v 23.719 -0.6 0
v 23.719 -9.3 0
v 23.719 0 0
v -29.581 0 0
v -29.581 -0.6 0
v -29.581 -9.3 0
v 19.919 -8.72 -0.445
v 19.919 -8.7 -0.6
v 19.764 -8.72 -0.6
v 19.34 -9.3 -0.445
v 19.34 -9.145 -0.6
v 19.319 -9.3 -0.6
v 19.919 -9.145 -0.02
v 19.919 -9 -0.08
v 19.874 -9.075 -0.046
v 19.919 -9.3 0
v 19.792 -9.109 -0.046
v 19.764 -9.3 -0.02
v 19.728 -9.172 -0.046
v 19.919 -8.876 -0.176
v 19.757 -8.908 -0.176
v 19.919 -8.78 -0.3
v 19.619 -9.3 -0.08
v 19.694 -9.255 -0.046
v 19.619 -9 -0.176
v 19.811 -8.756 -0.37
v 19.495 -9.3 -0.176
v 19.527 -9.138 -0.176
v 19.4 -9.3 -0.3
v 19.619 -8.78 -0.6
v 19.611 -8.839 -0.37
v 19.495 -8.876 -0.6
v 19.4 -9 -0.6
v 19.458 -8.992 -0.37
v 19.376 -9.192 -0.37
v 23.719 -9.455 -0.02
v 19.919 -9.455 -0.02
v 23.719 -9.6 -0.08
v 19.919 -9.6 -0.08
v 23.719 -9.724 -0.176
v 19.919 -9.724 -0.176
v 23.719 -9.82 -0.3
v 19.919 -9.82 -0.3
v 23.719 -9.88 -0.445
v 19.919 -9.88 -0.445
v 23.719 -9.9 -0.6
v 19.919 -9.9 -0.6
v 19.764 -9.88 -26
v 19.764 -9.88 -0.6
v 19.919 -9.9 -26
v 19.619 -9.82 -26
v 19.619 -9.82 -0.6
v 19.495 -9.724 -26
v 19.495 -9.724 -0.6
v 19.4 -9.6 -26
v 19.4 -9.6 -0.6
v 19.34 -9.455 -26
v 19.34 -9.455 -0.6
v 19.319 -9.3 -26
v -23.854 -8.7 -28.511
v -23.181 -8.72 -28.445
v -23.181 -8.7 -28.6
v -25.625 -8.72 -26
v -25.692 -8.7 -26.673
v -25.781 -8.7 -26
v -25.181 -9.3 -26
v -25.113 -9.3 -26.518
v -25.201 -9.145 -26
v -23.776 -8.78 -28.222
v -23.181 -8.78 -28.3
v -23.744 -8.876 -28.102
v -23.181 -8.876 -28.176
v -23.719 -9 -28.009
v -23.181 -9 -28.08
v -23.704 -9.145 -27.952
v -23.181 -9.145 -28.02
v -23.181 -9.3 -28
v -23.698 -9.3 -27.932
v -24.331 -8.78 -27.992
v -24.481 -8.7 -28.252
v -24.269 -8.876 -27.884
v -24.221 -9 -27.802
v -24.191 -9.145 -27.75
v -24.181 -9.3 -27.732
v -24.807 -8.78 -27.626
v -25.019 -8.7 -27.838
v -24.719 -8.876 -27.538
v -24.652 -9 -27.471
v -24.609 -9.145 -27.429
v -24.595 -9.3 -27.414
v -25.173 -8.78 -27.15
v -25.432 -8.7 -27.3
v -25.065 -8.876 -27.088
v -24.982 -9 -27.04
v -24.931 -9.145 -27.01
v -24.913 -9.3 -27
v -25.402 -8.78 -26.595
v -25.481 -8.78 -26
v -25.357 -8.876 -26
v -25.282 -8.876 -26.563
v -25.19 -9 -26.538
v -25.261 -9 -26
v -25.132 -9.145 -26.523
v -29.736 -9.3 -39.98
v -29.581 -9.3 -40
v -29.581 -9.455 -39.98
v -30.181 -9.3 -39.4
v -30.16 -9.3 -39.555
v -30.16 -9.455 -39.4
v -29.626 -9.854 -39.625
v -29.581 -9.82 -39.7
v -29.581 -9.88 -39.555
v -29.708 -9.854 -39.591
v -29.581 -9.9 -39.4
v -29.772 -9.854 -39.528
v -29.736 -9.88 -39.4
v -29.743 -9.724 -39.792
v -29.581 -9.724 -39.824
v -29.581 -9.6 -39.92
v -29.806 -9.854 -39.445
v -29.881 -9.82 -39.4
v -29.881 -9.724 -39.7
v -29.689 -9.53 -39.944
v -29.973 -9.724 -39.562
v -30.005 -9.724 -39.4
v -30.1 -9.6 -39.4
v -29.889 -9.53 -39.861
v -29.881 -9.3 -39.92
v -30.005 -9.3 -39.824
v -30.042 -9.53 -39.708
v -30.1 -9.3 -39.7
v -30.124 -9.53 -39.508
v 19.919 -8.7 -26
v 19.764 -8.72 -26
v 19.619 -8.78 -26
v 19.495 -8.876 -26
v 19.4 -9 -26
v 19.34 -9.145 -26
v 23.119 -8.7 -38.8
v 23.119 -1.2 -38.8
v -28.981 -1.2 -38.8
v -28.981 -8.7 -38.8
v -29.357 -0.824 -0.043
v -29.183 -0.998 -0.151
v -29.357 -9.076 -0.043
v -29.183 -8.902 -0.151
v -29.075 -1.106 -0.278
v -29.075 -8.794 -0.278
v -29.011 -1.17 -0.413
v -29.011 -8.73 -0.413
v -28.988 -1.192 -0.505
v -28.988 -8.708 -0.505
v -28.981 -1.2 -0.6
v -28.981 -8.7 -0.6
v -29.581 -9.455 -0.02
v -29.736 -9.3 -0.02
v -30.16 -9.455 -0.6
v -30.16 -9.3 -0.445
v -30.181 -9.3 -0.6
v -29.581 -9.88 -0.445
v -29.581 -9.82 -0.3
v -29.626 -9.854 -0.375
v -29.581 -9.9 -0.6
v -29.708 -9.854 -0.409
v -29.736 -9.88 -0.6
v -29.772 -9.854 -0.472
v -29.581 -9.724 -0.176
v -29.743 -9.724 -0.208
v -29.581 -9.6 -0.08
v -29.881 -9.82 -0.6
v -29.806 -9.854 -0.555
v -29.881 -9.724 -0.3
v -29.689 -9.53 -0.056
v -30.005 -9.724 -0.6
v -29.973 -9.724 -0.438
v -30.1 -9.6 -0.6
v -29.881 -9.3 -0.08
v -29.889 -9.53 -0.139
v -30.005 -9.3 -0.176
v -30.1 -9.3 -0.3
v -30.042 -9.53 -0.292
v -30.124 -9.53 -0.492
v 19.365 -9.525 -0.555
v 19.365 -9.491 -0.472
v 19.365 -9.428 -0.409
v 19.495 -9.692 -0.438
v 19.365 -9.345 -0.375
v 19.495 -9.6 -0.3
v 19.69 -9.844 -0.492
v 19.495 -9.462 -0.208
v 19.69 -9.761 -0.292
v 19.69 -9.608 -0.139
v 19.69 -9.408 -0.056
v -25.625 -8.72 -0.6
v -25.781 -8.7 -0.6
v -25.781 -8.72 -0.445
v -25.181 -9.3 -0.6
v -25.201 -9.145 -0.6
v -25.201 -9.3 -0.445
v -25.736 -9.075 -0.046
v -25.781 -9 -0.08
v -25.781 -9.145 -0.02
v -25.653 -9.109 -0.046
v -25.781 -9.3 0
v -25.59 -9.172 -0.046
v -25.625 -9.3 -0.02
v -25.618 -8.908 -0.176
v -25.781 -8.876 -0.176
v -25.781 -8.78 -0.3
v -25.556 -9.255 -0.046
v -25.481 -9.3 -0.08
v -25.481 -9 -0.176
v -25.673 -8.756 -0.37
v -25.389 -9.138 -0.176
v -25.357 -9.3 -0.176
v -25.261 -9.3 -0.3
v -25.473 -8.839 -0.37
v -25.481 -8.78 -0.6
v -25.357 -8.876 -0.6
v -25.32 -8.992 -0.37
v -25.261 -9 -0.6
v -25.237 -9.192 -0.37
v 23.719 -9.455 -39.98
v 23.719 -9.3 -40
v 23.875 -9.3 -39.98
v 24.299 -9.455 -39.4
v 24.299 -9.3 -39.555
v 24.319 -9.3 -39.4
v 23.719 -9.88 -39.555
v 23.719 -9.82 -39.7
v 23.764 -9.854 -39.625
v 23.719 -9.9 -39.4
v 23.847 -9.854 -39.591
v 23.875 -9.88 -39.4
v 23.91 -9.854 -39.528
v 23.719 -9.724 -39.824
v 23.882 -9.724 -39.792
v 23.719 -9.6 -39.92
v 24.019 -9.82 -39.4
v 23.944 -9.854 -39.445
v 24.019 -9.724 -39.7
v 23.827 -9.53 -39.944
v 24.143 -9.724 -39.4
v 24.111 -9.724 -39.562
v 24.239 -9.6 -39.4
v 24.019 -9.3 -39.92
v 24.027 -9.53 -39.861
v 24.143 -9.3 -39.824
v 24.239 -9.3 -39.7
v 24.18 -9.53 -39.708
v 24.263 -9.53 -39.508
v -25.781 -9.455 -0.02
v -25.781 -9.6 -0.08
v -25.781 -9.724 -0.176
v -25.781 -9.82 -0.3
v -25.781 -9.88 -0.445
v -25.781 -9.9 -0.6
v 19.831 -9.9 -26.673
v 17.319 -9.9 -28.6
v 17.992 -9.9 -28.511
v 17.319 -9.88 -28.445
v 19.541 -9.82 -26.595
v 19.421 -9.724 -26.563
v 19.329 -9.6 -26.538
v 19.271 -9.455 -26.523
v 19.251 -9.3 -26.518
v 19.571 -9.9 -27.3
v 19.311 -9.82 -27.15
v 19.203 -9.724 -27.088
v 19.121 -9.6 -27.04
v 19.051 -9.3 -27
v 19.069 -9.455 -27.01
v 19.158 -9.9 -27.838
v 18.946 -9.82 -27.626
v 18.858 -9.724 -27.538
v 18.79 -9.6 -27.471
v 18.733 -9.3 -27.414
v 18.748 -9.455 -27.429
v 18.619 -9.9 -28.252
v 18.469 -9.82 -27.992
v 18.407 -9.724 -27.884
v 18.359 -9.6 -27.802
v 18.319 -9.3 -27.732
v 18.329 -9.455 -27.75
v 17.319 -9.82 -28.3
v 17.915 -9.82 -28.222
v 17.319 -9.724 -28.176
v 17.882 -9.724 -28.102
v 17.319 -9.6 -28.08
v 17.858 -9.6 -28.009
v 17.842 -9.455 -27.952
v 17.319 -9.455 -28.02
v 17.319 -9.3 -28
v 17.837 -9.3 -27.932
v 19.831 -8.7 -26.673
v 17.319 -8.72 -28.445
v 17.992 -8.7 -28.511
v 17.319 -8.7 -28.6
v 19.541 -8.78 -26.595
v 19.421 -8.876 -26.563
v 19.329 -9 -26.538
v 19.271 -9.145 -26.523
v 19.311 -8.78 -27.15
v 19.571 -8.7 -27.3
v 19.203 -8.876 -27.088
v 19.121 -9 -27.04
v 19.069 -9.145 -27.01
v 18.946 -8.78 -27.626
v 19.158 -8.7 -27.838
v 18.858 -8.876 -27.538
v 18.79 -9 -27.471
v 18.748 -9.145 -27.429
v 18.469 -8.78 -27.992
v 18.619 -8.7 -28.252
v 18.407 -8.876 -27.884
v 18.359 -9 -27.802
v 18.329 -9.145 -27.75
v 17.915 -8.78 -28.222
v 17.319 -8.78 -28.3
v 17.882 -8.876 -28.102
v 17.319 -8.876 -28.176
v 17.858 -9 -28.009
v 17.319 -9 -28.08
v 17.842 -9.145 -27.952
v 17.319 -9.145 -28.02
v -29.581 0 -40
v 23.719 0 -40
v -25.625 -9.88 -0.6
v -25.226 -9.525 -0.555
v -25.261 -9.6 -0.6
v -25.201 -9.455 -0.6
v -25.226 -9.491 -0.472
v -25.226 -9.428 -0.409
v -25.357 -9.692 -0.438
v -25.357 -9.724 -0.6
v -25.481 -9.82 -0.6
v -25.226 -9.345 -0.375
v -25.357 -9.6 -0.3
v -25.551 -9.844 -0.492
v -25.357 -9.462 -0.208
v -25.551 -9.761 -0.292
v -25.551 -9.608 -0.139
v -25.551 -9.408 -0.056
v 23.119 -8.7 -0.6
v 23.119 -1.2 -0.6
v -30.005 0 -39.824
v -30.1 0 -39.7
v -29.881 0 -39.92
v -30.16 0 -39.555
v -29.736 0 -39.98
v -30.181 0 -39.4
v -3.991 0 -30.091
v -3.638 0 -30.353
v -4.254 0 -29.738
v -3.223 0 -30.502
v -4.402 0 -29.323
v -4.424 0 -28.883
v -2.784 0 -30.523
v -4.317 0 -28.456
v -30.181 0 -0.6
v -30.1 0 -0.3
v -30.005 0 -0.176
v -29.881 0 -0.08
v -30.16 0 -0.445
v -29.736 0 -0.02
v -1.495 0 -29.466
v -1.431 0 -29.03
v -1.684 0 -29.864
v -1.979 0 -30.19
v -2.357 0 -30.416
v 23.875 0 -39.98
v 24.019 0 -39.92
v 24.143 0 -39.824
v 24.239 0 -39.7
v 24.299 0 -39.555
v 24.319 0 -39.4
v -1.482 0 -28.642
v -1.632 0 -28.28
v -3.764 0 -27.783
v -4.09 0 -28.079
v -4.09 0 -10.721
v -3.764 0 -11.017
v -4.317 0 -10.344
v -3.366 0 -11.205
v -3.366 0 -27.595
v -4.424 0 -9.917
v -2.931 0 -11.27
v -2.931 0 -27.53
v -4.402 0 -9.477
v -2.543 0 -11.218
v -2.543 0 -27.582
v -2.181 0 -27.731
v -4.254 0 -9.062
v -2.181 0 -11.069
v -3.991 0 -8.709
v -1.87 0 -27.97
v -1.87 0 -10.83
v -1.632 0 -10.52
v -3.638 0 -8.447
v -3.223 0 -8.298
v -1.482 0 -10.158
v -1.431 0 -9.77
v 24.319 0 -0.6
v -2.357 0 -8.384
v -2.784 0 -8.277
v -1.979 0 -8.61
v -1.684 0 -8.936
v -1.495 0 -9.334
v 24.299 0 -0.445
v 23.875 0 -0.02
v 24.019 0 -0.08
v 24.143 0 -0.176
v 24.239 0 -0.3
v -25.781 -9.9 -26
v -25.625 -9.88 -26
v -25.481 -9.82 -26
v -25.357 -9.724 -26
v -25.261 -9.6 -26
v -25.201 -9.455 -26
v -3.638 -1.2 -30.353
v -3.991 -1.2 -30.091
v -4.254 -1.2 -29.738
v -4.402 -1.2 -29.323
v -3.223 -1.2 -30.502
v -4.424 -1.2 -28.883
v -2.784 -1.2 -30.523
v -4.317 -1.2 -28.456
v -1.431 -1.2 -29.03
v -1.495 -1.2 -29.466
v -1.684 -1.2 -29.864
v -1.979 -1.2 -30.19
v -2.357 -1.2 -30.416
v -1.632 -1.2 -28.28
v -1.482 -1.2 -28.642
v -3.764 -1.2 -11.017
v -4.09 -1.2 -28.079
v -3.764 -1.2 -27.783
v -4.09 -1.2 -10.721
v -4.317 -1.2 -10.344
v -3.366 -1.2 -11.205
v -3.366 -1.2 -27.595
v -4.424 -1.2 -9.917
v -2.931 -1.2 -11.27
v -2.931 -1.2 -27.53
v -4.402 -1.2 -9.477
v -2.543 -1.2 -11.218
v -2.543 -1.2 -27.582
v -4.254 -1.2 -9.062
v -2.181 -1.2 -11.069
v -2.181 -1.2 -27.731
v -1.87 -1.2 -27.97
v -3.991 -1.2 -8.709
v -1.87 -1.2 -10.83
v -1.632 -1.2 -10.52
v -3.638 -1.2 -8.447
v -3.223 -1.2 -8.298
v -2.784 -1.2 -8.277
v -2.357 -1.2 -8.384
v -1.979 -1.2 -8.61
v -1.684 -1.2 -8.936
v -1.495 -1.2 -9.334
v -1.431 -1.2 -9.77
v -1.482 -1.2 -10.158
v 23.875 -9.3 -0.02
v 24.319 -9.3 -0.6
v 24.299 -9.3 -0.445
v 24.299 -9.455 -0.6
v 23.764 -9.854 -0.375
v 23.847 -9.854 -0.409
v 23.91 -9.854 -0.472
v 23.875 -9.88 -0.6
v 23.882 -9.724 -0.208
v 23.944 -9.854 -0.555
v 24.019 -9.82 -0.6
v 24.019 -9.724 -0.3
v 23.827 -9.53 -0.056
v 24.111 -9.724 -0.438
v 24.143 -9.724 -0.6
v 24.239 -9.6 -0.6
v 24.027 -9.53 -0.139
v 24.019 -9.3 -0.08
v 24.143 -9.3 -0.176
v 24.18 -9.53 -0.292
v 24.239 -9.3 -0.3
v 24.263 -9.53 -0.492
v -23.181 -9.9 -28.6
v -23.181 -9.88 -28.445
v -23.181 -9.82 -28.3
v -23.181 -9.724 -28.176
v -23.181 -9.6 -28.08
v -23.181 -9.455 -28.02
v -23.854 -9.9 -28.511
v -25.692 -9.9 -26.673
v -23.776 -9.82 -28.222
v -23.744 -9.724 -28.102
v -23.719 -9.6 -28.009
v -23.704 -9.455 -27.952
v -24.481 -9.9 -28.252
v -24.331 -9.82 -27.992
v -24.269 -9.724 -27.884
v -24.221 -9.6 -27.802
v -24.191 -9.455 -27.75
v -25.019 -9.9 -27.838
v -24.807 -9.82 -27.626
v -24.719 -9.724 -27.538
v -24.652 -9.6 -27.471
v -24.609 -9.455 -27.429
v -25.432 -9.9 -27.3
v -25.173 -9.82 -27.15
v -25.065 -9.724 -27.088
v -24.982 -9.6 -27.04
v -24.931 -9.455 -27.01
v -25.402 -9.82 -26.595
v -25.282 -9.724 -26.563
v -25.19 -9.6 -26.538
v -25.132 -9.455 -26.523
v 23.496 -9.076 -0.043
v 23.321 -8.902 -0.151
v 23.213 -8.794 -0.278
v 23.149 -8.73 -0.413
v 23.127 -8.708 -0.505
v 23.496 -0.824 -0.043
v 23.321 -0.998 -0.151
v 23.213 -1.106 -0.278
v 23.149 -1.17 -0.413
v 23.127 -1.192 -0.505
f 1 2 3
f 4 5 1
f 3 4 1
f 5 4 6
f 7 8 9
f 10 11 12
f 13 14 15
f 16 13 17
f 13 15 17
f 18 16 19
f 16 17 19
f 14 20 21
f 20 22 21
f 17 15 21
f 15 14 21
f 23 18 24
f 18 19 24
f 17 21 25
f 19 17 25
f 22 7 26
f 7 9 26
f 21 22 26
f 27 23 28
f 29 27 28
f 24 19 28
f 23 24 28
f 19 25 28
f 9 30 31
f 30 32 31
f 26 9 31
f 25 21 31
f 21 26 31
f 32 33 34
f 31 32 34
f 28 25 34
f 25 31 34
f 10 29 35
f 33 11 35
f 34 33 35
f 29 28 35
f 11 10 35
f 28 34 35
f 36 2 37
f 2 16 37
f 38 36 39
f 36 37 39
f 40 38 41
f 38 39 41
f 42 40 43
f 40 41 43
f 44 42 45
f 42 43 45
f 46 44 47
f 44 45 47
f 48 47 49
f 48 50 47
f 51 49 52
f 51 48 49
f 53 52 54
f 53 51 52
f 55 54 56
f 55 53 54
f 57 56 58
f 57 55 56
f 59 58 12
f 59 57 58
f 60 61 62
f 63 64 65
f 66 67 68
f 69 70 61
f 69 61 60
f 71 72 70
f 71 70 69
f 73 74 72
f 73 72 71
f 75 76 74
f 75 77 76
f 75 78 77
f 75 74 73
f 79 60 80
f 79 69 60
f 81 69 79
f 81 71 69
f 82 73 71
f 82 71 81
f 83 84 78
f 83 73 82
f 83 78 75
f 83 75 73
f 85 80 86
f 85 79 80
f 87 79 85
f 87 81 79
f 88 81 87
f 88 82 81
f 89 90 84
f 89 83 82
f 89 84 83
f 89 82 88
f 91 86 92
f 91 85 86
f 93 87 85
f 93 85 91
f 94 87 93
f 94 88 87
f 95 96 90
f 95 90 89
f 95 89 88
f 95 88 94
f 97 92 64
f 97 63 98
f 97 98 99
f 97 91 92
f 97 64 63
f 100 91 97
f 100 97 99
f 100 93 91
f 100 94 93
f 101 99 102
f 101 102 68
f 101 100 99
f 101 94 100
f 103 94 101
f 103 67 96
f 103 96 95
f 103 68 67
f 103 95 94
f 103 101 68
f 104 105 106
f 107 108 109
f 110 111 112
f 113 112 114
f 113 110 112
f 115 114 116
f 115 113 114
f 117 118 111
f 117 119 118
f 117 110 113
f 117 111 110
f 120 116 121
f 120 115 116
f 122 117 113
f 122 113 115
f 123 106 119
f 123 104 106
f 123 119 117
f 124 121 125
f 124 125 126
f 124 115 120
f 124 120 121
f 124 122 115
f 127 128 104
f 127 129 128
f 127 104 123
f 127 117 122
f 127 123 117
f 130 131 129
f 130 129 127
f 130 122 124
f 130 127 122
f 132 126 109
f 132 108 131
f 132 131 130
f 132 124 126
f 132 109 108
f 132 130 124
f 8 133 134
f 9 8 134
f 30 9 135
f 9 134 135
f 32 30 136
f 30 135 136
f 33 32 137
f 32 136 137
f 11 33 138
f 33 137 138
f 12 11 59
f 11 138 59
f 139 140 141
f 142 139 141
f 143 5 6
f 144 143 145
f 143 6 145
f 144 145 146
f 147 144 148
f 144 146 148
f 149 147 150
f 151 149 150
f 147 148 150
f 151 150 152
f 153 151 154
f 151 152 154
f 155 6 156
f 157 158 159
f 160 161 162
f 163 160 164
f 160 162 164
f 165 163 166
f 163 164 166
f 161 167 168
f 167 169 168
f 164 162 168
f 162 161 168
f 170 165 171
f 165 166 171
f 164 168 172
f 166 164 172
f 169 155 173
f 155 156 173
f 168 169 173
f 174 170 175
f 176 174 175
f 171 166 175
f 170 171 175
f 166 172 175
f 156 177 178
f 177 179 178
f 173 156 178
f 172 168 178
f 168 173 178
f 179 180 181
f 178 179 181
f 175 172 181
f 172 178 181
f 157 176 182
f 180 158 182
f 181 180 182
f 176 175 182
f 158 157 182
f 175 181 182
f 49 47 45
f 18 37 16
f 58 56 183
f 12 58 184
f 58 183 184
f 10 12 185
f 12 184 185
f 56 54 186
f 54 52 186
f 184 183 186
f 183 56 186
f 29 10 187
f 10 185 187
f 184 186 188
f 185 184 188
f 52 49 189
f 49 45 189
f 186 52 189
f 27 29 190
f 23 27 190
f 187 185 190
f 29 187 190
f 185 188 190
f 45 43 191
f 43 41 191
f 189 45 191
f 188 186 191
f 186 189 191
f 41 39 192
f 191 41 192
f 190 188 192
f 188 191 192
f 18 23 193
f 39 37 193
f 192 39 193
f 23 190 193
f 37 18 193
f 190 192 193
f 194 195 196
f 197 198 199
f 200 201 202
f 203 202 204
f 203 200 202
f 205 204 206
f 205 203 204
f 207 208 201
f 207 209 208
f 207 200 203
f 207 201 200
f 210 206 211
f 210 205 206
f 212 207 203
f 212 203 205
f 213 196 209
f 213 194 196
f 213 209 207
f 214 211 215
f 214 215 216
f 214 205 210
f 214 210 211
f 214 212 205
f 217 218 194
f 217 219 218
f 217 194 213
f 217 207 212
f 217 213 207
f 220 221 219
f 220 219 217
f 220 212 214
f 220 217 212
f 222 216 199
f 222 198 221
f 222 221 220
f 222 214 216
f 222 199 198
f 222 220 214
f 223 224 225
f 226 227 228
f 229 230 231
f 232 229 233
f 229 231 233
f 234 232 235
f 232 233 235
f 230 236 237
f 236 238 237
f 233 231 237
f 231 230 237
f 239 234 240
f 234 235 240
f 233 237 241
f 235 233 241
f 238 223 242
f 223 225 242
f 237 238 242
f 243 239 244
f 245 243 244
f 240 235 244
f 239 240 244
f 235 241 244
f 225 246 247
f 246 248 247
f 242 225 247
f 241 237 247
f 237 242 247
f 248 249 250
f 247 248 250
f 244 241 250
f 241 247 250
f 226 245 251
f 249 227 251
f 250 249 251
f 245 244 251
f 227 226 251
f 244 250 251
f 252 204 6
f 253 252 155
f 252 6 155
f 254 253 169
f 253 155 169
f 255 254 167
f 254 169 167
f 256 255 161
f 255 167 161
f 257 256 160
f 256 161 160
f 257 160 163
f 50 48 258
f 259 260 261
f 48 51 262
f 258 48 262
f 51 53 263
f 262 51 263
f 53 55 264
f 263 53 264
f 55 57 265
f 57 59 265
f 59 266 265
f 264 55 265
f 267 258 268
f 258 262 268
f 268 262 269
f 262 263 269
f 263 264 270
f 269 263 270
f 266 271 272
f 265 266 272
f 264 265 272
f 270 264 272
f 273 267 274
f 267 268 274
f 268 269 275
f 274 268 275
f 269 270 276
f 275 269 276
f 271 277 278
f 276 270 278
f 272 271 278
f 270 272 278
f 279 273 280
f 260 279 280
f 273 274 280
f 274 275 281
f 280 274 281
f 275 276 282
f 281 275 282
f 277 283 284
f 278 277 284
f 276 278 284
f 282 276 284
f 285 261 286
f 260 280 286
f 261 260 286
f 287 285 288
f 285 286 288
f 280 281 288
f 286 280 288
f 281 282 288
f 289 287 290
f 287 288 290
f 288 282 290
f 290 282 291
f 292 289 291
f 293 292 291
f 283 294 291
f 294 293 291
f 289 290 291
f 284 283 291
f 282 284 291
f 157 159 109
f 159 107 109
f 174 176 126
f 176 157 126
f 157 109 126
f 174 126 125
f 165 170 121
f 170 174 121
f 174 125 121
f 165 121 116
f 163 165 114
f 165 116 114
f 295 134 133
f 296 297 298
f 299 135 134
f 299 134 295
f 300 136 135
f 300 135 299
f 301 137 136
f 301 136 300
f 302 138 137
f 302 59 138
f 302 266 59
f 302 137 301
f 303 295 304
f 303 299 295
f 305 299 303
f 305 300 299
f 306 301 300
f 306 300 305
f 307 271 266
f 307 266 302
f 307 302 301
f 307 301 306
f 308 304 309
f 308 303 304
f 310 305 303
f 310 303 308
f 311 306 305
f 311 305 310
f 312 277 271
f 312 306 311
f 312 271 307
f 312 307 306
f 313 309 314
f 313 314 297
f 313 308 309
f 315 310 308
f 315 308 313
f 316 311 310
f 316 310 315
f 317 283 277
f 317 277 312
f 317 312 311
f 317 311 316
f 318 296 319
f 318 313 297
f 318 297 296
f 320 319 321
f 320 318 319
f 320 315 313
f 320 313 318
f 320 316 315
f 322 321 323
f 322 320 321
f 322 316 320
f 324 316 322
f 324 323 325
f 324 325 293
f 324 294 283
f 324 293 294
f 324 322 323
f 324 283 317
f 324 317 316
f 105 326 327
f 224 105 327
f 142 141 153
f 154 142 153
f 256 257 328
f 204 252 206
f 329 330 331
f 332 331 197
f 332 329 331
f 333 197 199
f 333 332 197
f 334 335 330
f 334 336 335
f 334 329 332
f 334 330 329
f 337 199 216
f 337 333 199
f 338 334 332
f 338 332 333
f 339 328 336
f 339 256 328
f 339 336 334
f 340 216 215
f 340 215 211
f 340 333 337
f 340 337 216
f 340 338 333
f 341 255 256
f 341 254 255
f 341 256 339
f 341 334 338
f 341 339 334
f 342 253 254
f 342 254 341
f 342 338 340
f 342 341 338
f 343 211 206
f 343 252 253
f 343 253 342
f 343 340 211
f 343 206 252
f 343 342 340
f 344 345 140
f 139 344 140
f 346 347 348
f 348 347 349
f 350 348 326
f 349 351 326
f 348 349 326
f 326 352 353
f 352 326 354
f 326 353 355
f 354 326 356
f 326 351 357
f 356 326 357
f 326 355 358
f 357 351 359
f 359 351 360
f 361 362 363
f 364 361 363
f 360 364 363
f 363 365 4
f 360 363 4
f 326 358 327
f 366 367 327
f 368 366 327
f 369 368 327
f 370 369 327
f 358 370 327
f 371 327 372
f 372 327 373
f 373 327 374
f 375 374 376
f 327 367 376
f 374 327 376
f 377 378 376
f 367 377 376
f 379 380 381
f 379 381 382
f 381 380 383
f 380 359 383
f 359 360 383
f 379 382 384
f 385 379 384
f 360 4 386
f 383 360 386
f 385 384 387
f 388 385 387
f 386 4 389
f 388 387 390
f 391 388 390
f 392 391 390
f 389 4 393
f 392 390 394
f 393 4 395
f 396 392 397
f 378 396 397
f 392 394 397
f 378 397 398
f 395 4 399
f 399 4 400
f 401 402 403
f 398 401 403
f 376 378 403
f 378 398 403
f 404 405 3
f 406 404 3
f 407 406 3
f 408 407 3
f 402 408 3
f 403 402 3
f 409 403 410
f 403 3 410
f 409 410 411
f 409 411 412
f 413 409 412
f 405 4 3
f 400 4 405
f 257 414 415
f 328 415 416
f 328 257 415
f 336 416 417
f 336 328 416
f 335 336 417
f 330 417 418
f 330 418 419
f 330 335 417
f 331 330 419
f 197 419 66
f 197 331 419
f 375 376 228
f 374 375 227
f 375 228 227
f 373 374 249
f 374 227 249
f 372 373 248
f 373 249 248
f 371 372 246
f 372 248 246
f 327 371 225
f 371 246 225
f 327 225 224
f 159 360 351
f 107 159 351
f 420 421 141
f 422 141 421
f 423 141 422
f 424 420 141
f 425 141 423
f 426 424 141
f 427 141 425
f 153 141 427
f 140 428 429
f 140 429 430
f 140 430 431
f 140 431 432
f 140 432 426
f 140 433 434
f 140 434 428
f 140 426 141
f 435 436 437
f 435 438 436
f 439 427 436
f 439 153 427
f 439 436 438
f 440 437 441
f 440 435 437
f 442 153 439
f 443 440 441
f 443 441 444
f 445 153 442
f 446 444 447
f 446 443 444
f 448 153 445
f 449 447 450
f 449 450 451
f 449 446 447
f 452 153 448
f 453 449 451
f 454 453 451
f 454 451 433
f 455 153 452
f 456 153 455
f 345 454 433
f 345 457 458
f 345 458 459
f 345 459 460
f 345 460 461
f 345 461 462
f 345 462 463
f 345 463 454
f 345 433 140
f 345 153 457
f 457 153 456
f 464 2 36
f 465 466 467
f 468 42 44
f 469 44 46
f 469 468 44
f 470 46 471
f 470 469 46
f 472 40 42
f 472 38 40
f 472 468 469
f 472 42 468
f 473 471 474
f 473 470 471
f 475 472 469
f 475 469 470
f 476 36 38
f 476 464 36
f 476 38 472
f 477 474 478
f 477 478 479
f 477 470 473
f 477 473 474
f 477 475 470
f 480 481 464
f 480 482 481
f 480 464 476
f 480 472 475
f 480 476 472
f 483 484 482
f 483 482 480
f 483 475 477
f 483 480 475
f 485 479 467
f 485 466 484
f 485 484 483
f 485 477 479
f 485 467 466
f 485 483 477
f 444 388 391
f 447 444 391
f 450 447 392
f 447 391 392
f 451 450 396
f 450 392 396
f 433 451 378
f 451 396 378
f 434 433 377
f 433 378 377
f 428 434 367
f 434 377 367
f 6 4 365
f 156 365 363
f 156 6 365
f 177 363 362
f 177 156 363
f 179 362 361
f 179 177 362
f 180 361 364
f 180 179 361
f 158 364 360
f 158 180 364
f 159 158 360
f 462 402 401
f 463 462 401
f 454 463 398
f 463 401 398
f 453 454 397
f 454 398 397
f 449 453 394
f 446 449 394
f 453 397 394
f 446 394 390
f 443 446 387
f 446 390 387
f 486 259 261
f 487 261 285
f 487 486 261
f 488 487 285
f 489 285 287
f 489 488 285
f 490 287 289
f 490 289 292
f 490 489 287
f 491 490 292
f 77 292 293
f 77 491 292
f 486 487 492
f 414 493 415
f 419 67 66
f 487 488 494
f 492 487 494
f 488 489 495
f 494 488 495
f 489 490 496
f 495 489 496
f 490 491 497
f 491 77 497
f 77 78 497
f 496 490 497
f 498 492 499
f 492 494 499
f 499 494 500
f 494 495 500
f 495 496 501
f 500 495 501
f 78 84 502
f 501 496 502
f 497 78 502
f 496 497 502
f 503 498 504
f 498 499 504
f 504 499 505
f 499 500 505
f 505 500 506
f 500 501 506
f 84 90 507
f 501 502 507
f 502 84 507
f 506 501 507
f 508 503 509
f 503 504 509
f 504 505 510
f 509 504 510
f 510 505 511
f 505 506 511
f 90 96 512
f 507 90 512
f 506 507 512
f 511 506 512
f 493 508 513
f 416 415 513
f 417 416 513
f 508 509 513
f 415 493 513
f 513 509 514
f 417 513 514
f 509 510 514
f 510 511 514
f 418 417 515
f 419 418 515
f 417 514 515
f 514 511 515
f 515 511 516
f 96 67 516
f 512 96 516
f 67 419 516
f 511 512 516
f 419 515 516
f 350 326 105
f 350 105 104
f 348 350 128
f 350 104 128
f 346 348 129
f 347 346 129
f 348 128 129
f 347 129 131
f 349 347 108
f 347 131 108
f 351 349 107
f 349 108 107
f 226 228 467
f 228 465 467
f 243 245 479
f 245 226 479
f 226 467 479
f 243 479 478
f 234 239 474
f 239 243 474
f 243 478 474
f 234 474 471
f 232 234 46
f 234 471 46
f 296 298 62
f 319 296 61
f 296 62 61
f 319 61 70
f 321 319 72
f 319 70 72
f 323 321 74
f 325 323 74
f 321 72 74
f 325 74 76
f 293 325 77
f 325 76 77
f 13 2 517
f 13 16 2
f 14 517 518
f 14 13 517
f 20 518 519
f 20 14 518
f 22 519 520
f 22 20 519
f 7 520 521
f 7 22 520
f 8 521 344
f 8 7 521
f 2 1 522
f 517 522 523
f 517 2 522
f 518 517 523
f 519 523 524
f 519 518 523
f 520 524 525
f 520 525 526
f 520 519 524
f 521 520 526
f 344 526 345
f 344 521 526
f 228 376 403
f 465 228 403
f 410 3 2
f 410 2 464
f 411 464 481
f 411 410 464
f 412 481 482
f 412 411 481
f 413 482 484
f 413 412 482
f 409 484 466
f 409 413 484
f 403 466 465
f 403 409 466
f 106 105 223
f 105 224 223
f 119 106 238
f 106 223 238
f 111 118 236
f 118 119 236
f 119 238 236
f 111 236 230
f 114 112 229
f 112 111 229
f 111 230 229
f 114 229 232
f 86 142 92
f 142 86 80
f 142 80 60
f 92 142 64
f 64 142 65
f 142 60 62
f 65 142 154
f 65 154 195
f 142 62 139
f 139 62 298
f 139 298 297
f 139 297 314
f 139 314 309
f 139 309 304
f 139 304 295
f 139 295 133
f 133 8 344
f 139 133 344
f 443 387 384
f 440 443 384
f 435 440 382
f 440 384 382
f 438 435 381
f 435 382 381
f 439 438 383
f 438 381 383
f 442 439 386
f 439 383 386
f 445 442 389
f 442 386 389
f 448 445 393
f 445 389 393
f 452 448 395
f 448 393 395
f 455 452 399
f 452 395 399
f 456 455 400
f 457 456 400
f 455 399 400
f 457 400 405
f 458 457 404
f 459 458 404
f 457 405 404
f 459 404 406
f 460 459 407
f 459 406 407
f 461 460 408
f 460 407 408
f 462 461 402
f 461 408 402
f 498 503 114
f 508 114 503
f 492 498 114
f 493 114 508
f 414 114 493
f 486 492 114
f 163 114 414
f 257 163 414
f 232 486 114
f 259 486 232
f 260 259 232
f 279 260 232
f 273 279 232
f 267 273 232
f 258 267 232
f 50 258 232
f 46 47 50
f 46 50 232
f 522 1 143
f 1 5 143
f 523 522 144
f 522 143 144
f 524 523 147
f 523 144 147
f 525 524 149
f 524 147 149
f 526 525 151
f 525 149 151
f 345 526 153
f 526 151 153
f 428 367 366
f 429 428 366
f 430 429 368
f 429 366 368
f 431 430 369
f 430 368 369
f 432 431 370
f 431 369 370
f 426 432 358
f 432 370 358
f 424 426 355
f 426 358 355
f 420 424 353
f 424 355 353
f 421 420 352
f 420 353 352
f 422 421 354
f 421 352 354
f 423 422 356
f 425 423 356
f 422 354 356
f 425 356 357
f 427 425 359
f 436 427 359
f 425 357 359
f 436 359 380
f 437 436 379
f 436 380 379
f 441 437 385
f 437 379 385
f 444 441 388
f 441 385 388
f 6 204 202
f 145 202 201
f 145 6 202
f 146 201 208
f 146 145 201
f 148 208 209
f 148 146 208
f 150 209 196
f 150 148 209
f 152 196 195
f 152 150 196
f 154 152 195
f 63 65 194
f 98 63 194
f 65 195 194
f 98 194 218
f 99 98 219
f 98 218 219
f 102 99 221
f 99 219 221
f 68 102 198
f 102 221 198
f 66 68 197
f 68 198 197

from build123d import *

# Parameters (mm, degrees)
F1_DEPTH = 1.2
F3_DEPTH = 7.5
F5_DEPTH = 1.2
F6_R     = 0.59999


# Not quite as in the source:
# - a fillet or chamfer is up to 0.001 mm smaller than in the source, because OpenCascade refuses the exact size


with BuildPart() as f1:
    # F0 (on Front) → F1 (new body)
    with BuildSketch(Plane.XZ):
        Polygon((-28.9807687655, 0), (-30.1807687655, 0), (-30.1807687655, -40), (24.3192312345, -40), (24.3192312345, 0), (23.1192312345, 0), (23.1192312345, -38.8), (-28.9807687655, -38.8), align=None)
        Polygon((-2.9307687655, -19.4), (-28.9807687655, 0), (-28.9807687655, -38.8), align=None)
        with BuildLine():
            Line((23.1192312345, 0), (-28.9807687655, 0))
            Line((-28.9807687655, 0), (-2.9307687655, -19.4))
            Line((-2.9307687655, -19.4), (-2.9307687655, -11.2695819765))
            ThreePointArc((-2.9307687655, -11.2695819765), (-3.9914289373, -8.7089218048), (-1.4307687655, -9.7695819765))
            Line((-1.4307687655, -9.7695819765), (3.4249790478, -9.7695819765))
            Line((3.4249790478, -9.7695819765), (3.4249790478, -14.6667367532))
            Line((3.4249790478, -14.6667367532), (23.1192312345, 0))
        make_face()
        Polygon((23.1192312345, -38.8), (23.1192312345, 0), (3.4249790478, -14.6667367532), (3.4249790478, -19.4), (3.3088028431, -19.4), (3.3088028431, -24.0467443074), align=None)
        with BuildLine():
            Line((-2.9307687655, -19.4), (-28.9807687655, -38.8))
            Line((-28.9807687655, -38.8), (23.1192312345, -38.8))
            Line((23.1192312345, -38.8), (3.3088028431, -24.0467443074))
            Line((3.3088028431, -24.0467443074), (3.3088028431, -29.0304180235))
            Line((3.3088028431, -29.0304180235), (-1.4307687655, -29.0304180235))
            ThreePointArc((-1.4307687655, -29.0304180235), (-3.9914289373, -30.0910781952), (-2.9307687655, -27.5304180235))
            Line((-2.9307687655, -27.5304180235), (-2.9307687655, -19.4))
        make_face()
        with BuildLine():
            Line((3.3088028431, -24.0467443074), (-2.9307687655, -19.4))
            Line((-2.9307687655, -19.4), (-2.9307687655, -27.5304180235))
            ThreePointArc((-2.9307687655, -27.5304180235), (-1.8701085937, -27.9697578517), (-1.4307687655, -29.0304180235))
            Line((-1.4307687655, -29.0304180235), (3.3088028431, -29.0304180235))
            Line((3.3088028431, -29.0304180235), (3.3088028431, -24.0467443074))
        make_face()
        Polygon((3.3088028431, -19.4), (-2.9307687655, -19.4), (3.3088028431, -24.0467443074), align=None)
        Polygon((3.4249790478, -14.6667367532), (-2.9307687655, -19.4), (3.3088028431, -19.4), (3.4249790478, -19.4), align=None)
        with BuildLine():
            Line((-2.9307687655, -11.2695819765), (-2.9307687655, -19.4))
            Line((-2.9307687655, -19.4), (3.4249790478, -14.6667367532))
            Line((3.4249790478, -14.6667367532), (3.4249790478, -9.7695819765))
            Line((3.4249790478, -9.7695819765), (-1.4307687655, -9.7695819765))
            ThreePointArc((-1.4307687655, -9.7695819765), (-1.8701085937, -10.8302421483), (-2.9307687655, -11.2695819765))
        make_face()
    extrude(amount=F1_DEPTH)

    # F2 (on face) → F3 (join)
    with BuildSketch(Plane.XZ.offset(1.2)):
        Polygon((-30.1807687655, 0), (-30.1807687655, -40), (24.3192312345, -40), (24.3192312345, 0), (23.1192312345, 0), (23.1192312345, -38.8), (-28.9807687655, -38.8), (-28.9807687655, 0), align=None)
    extrude(amount=F3_DEPTH)

    # F4 (on face) → F5 (join)
    with BuildSketch(Plane.XZ.offset(8.7)):
        with BuildLine():
            Line((-25.1807687655, 0), (-28.9807687655, 0))
            Line((-28.9807687655, 0), (-28.9807687655, -38.8))
            Line((-28.9807687655, -38.8), (23.1192312345, -38.8))
            Line((23.1192312345, -38.8), (23.1192312345, 0))
            Line((23.1192312345, 0), (19.3192312345, 0))
            Line((19.3192312345, 0), (19.3192312345, -26))
            ThreePointArc((19.3192312345, -26), (18.7334447969, -27.4142135624), (17.3192312345, -28))
            Line((17.3192312345, -28), (-23.1807687655, -28))
            ThreePointArc((-23.1807687655, -28), (-24.5949823279, -27.4142135624), (-25.1807687655, -26))
            Line((-25.1807687655, -26), (-25.1807687655, 0))
        make_face()
        Polygon((-30.1807687655, 0), (-30.1807687655, -40), (24.3192312345, -40), (24.3192312345, 0), (23.1192312345, 0), (23.1192312345, -38.8), (-28.9807687655, -38.8), (-28.9807687655, 0), align=None)
    extrude(amount=F5_DEPTH)

    # F6 (radius 0.6 in the source; OpenCascade refuses exactly that, so slightly less here)
    f6_edges = [f1.edges().sort_by_distance(p)[0] for p in [
        (-30.180769, -4.95, -40),
        (24.319231, -4.95, -40),
        (-30.180769, -4.95, 0),
        (-27.680769, -9.9, 0),
        (24.319231, -4.95, 0),
        (21.819231, -9.9, 0),
        (-2.930769, -9.9, -40),
        (24.319231, -9.9, -20),
        (-30.180769, -9.9, -20),
        (-25.180769, -9.9, -13),
        (-2.930769, -8.7, -28),
        (19.319231, -8.7, -13),
        (-27.080769, -8.7, 0),
        (-28.980769, -4.95, 0),
        (23.119231, -4.95, 0),
        (21.219231, -8.7, 0),
        (19.319231, -9.3, 0),
        (-25.180769, -9.3, 0),
        (-2.930769, -1.2, 0),
    ]]
    fillet(f6_edges, radius=F6_R)


solid = f1.part
